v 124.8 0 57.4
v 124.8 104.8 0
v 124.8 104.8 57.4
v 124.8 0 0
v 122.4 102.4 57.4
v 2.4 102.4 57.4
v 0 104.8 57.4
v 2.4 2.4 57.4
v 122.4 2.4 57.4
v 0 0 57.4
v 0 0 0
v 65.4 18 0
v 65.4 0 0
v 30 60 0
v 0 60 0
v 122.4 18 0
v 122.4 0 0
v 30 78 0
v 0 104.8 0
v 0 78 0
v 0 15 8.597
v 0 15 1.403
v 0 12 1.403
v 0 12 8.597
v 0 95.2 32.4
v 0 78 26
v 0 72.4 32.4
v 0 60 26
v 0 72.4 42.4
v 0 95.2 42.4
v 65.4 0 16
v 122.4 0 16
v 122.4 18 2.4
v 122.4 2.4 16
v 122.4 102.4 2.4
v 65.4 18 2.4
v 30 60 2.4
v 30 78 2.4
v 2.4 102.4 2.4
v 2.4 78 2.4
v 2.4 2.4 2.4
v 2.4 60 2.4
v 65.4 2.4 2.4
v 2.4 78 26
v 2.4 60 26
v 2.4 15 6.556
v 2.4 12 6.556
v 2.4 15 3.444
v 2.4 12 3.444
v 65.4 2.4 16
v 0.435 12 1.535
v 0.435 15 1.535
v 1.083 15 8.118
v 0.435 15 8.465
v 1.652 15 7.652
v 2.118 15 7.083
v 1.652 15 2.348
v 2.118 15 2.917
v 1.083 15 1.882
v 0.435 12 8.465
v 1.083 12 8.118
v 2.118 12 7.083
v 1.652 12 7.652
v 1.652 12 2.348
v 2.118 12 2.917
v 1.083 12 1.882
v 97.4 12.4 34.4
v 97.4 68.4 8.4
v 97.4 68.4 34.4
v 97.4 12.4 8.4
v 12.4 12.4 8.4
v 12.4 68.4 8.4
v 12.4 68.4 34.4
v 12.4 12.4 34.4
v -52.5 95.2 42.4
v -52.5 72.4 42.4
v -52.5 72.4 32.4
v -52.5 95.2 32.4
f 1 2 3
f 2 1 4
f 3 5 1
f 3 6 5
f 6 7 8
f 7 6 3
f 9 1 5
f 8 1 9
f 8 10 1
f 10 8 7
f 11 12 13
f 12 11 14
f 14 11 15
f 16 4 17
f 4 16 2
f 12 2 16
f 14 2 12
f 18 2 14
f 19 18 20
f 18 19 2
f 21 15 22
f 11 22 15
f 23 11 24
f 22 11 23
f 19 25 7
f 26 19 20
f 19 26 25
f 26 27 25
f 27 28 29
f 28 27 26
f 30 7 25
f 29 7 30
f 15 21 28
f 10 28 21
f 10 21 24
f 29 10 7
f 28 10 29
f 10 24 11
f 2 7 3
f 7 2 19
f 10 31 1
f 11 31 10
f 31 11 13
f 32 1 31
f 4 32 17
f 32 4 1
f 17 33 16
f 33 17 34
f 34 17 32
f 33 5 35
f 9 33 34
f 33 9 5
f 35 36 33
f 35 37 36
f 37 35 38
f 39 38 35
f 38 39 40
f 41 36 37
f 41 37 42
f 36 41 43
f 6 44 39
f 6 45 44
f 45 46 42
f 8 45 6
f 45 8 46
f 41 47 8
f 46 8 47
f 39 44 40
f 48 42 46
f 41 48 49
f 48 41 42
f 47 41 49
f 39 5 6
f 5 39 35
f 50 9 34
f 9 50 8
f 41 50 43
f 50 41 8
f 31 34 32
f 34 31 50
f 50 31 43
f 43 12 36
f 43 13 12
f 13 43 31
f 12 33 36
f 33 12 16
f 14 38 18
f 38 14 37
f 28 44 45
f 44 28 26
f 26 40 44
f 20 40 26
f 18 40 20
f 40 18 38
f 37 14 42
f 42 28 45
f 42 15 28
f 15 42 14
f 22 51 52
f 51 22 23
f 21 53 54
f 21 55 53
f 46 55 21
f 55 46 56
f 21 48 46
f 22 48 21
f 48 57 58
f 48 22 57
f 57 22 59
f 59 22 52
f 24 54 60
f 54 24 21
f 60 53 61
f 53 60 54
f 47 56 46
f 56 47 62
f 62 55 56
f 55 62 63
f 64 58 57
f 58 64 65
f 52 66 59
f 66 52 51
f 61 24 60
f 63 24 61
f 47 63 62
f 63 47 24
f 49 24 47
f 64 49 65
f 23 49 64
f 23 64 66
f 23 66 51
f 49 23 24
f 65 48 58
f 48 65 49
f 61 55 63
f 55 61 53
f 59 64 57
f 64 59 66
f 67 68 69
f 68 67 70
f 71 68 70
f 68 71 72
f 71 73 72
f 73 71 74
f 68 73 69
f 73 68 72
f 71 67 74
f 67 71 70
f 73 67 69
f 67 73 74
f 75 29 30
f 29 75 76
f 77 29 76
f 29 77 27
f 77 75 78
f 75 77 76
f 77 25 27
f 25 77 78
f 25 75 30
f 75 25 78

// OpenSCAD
inner = [120,100,55];
wall  = 2.4;

module pcb(w,d,h){ color("#4c8") cube([w,d,h]); }
module cutout(x,y,w,d,h=15){ translate([x,y,-1]) cube([w,d,h+2]); }

difference() {
    // outer walls
    cube(inner + [2*wall,2*wall,wall], center=false);
    
    // hollow interior
    translate([wall,wall,wall])
        cube(inner,center=false);
    
    // front vent + USB
    cutout(inner[0]+wall-57, 0, 57,18);
    
    // TFT window (moved to opposite end)
    cutout(0, 60, 30,18,25);  // << moved to left side
    
    // RCA grommet
    translate([-1,15,5])
        rotate([90,0,0])
        cylinder(h=3,d=7.5,$fn=32);
}

// Raspberry Pi 5 (bottom board)
translate([wall+10, wall+10, wall+6])
    pcb(85,56,16);

// Voice Bonnet (stacked)
translate([wall+10, wall+10, wall+22])
    pcb(85,56,10);

// Feather S3 display
translate([0, wall+70, wall+30])
    rotate([0,0,90])
    pcb(22.8,52.5,10);
